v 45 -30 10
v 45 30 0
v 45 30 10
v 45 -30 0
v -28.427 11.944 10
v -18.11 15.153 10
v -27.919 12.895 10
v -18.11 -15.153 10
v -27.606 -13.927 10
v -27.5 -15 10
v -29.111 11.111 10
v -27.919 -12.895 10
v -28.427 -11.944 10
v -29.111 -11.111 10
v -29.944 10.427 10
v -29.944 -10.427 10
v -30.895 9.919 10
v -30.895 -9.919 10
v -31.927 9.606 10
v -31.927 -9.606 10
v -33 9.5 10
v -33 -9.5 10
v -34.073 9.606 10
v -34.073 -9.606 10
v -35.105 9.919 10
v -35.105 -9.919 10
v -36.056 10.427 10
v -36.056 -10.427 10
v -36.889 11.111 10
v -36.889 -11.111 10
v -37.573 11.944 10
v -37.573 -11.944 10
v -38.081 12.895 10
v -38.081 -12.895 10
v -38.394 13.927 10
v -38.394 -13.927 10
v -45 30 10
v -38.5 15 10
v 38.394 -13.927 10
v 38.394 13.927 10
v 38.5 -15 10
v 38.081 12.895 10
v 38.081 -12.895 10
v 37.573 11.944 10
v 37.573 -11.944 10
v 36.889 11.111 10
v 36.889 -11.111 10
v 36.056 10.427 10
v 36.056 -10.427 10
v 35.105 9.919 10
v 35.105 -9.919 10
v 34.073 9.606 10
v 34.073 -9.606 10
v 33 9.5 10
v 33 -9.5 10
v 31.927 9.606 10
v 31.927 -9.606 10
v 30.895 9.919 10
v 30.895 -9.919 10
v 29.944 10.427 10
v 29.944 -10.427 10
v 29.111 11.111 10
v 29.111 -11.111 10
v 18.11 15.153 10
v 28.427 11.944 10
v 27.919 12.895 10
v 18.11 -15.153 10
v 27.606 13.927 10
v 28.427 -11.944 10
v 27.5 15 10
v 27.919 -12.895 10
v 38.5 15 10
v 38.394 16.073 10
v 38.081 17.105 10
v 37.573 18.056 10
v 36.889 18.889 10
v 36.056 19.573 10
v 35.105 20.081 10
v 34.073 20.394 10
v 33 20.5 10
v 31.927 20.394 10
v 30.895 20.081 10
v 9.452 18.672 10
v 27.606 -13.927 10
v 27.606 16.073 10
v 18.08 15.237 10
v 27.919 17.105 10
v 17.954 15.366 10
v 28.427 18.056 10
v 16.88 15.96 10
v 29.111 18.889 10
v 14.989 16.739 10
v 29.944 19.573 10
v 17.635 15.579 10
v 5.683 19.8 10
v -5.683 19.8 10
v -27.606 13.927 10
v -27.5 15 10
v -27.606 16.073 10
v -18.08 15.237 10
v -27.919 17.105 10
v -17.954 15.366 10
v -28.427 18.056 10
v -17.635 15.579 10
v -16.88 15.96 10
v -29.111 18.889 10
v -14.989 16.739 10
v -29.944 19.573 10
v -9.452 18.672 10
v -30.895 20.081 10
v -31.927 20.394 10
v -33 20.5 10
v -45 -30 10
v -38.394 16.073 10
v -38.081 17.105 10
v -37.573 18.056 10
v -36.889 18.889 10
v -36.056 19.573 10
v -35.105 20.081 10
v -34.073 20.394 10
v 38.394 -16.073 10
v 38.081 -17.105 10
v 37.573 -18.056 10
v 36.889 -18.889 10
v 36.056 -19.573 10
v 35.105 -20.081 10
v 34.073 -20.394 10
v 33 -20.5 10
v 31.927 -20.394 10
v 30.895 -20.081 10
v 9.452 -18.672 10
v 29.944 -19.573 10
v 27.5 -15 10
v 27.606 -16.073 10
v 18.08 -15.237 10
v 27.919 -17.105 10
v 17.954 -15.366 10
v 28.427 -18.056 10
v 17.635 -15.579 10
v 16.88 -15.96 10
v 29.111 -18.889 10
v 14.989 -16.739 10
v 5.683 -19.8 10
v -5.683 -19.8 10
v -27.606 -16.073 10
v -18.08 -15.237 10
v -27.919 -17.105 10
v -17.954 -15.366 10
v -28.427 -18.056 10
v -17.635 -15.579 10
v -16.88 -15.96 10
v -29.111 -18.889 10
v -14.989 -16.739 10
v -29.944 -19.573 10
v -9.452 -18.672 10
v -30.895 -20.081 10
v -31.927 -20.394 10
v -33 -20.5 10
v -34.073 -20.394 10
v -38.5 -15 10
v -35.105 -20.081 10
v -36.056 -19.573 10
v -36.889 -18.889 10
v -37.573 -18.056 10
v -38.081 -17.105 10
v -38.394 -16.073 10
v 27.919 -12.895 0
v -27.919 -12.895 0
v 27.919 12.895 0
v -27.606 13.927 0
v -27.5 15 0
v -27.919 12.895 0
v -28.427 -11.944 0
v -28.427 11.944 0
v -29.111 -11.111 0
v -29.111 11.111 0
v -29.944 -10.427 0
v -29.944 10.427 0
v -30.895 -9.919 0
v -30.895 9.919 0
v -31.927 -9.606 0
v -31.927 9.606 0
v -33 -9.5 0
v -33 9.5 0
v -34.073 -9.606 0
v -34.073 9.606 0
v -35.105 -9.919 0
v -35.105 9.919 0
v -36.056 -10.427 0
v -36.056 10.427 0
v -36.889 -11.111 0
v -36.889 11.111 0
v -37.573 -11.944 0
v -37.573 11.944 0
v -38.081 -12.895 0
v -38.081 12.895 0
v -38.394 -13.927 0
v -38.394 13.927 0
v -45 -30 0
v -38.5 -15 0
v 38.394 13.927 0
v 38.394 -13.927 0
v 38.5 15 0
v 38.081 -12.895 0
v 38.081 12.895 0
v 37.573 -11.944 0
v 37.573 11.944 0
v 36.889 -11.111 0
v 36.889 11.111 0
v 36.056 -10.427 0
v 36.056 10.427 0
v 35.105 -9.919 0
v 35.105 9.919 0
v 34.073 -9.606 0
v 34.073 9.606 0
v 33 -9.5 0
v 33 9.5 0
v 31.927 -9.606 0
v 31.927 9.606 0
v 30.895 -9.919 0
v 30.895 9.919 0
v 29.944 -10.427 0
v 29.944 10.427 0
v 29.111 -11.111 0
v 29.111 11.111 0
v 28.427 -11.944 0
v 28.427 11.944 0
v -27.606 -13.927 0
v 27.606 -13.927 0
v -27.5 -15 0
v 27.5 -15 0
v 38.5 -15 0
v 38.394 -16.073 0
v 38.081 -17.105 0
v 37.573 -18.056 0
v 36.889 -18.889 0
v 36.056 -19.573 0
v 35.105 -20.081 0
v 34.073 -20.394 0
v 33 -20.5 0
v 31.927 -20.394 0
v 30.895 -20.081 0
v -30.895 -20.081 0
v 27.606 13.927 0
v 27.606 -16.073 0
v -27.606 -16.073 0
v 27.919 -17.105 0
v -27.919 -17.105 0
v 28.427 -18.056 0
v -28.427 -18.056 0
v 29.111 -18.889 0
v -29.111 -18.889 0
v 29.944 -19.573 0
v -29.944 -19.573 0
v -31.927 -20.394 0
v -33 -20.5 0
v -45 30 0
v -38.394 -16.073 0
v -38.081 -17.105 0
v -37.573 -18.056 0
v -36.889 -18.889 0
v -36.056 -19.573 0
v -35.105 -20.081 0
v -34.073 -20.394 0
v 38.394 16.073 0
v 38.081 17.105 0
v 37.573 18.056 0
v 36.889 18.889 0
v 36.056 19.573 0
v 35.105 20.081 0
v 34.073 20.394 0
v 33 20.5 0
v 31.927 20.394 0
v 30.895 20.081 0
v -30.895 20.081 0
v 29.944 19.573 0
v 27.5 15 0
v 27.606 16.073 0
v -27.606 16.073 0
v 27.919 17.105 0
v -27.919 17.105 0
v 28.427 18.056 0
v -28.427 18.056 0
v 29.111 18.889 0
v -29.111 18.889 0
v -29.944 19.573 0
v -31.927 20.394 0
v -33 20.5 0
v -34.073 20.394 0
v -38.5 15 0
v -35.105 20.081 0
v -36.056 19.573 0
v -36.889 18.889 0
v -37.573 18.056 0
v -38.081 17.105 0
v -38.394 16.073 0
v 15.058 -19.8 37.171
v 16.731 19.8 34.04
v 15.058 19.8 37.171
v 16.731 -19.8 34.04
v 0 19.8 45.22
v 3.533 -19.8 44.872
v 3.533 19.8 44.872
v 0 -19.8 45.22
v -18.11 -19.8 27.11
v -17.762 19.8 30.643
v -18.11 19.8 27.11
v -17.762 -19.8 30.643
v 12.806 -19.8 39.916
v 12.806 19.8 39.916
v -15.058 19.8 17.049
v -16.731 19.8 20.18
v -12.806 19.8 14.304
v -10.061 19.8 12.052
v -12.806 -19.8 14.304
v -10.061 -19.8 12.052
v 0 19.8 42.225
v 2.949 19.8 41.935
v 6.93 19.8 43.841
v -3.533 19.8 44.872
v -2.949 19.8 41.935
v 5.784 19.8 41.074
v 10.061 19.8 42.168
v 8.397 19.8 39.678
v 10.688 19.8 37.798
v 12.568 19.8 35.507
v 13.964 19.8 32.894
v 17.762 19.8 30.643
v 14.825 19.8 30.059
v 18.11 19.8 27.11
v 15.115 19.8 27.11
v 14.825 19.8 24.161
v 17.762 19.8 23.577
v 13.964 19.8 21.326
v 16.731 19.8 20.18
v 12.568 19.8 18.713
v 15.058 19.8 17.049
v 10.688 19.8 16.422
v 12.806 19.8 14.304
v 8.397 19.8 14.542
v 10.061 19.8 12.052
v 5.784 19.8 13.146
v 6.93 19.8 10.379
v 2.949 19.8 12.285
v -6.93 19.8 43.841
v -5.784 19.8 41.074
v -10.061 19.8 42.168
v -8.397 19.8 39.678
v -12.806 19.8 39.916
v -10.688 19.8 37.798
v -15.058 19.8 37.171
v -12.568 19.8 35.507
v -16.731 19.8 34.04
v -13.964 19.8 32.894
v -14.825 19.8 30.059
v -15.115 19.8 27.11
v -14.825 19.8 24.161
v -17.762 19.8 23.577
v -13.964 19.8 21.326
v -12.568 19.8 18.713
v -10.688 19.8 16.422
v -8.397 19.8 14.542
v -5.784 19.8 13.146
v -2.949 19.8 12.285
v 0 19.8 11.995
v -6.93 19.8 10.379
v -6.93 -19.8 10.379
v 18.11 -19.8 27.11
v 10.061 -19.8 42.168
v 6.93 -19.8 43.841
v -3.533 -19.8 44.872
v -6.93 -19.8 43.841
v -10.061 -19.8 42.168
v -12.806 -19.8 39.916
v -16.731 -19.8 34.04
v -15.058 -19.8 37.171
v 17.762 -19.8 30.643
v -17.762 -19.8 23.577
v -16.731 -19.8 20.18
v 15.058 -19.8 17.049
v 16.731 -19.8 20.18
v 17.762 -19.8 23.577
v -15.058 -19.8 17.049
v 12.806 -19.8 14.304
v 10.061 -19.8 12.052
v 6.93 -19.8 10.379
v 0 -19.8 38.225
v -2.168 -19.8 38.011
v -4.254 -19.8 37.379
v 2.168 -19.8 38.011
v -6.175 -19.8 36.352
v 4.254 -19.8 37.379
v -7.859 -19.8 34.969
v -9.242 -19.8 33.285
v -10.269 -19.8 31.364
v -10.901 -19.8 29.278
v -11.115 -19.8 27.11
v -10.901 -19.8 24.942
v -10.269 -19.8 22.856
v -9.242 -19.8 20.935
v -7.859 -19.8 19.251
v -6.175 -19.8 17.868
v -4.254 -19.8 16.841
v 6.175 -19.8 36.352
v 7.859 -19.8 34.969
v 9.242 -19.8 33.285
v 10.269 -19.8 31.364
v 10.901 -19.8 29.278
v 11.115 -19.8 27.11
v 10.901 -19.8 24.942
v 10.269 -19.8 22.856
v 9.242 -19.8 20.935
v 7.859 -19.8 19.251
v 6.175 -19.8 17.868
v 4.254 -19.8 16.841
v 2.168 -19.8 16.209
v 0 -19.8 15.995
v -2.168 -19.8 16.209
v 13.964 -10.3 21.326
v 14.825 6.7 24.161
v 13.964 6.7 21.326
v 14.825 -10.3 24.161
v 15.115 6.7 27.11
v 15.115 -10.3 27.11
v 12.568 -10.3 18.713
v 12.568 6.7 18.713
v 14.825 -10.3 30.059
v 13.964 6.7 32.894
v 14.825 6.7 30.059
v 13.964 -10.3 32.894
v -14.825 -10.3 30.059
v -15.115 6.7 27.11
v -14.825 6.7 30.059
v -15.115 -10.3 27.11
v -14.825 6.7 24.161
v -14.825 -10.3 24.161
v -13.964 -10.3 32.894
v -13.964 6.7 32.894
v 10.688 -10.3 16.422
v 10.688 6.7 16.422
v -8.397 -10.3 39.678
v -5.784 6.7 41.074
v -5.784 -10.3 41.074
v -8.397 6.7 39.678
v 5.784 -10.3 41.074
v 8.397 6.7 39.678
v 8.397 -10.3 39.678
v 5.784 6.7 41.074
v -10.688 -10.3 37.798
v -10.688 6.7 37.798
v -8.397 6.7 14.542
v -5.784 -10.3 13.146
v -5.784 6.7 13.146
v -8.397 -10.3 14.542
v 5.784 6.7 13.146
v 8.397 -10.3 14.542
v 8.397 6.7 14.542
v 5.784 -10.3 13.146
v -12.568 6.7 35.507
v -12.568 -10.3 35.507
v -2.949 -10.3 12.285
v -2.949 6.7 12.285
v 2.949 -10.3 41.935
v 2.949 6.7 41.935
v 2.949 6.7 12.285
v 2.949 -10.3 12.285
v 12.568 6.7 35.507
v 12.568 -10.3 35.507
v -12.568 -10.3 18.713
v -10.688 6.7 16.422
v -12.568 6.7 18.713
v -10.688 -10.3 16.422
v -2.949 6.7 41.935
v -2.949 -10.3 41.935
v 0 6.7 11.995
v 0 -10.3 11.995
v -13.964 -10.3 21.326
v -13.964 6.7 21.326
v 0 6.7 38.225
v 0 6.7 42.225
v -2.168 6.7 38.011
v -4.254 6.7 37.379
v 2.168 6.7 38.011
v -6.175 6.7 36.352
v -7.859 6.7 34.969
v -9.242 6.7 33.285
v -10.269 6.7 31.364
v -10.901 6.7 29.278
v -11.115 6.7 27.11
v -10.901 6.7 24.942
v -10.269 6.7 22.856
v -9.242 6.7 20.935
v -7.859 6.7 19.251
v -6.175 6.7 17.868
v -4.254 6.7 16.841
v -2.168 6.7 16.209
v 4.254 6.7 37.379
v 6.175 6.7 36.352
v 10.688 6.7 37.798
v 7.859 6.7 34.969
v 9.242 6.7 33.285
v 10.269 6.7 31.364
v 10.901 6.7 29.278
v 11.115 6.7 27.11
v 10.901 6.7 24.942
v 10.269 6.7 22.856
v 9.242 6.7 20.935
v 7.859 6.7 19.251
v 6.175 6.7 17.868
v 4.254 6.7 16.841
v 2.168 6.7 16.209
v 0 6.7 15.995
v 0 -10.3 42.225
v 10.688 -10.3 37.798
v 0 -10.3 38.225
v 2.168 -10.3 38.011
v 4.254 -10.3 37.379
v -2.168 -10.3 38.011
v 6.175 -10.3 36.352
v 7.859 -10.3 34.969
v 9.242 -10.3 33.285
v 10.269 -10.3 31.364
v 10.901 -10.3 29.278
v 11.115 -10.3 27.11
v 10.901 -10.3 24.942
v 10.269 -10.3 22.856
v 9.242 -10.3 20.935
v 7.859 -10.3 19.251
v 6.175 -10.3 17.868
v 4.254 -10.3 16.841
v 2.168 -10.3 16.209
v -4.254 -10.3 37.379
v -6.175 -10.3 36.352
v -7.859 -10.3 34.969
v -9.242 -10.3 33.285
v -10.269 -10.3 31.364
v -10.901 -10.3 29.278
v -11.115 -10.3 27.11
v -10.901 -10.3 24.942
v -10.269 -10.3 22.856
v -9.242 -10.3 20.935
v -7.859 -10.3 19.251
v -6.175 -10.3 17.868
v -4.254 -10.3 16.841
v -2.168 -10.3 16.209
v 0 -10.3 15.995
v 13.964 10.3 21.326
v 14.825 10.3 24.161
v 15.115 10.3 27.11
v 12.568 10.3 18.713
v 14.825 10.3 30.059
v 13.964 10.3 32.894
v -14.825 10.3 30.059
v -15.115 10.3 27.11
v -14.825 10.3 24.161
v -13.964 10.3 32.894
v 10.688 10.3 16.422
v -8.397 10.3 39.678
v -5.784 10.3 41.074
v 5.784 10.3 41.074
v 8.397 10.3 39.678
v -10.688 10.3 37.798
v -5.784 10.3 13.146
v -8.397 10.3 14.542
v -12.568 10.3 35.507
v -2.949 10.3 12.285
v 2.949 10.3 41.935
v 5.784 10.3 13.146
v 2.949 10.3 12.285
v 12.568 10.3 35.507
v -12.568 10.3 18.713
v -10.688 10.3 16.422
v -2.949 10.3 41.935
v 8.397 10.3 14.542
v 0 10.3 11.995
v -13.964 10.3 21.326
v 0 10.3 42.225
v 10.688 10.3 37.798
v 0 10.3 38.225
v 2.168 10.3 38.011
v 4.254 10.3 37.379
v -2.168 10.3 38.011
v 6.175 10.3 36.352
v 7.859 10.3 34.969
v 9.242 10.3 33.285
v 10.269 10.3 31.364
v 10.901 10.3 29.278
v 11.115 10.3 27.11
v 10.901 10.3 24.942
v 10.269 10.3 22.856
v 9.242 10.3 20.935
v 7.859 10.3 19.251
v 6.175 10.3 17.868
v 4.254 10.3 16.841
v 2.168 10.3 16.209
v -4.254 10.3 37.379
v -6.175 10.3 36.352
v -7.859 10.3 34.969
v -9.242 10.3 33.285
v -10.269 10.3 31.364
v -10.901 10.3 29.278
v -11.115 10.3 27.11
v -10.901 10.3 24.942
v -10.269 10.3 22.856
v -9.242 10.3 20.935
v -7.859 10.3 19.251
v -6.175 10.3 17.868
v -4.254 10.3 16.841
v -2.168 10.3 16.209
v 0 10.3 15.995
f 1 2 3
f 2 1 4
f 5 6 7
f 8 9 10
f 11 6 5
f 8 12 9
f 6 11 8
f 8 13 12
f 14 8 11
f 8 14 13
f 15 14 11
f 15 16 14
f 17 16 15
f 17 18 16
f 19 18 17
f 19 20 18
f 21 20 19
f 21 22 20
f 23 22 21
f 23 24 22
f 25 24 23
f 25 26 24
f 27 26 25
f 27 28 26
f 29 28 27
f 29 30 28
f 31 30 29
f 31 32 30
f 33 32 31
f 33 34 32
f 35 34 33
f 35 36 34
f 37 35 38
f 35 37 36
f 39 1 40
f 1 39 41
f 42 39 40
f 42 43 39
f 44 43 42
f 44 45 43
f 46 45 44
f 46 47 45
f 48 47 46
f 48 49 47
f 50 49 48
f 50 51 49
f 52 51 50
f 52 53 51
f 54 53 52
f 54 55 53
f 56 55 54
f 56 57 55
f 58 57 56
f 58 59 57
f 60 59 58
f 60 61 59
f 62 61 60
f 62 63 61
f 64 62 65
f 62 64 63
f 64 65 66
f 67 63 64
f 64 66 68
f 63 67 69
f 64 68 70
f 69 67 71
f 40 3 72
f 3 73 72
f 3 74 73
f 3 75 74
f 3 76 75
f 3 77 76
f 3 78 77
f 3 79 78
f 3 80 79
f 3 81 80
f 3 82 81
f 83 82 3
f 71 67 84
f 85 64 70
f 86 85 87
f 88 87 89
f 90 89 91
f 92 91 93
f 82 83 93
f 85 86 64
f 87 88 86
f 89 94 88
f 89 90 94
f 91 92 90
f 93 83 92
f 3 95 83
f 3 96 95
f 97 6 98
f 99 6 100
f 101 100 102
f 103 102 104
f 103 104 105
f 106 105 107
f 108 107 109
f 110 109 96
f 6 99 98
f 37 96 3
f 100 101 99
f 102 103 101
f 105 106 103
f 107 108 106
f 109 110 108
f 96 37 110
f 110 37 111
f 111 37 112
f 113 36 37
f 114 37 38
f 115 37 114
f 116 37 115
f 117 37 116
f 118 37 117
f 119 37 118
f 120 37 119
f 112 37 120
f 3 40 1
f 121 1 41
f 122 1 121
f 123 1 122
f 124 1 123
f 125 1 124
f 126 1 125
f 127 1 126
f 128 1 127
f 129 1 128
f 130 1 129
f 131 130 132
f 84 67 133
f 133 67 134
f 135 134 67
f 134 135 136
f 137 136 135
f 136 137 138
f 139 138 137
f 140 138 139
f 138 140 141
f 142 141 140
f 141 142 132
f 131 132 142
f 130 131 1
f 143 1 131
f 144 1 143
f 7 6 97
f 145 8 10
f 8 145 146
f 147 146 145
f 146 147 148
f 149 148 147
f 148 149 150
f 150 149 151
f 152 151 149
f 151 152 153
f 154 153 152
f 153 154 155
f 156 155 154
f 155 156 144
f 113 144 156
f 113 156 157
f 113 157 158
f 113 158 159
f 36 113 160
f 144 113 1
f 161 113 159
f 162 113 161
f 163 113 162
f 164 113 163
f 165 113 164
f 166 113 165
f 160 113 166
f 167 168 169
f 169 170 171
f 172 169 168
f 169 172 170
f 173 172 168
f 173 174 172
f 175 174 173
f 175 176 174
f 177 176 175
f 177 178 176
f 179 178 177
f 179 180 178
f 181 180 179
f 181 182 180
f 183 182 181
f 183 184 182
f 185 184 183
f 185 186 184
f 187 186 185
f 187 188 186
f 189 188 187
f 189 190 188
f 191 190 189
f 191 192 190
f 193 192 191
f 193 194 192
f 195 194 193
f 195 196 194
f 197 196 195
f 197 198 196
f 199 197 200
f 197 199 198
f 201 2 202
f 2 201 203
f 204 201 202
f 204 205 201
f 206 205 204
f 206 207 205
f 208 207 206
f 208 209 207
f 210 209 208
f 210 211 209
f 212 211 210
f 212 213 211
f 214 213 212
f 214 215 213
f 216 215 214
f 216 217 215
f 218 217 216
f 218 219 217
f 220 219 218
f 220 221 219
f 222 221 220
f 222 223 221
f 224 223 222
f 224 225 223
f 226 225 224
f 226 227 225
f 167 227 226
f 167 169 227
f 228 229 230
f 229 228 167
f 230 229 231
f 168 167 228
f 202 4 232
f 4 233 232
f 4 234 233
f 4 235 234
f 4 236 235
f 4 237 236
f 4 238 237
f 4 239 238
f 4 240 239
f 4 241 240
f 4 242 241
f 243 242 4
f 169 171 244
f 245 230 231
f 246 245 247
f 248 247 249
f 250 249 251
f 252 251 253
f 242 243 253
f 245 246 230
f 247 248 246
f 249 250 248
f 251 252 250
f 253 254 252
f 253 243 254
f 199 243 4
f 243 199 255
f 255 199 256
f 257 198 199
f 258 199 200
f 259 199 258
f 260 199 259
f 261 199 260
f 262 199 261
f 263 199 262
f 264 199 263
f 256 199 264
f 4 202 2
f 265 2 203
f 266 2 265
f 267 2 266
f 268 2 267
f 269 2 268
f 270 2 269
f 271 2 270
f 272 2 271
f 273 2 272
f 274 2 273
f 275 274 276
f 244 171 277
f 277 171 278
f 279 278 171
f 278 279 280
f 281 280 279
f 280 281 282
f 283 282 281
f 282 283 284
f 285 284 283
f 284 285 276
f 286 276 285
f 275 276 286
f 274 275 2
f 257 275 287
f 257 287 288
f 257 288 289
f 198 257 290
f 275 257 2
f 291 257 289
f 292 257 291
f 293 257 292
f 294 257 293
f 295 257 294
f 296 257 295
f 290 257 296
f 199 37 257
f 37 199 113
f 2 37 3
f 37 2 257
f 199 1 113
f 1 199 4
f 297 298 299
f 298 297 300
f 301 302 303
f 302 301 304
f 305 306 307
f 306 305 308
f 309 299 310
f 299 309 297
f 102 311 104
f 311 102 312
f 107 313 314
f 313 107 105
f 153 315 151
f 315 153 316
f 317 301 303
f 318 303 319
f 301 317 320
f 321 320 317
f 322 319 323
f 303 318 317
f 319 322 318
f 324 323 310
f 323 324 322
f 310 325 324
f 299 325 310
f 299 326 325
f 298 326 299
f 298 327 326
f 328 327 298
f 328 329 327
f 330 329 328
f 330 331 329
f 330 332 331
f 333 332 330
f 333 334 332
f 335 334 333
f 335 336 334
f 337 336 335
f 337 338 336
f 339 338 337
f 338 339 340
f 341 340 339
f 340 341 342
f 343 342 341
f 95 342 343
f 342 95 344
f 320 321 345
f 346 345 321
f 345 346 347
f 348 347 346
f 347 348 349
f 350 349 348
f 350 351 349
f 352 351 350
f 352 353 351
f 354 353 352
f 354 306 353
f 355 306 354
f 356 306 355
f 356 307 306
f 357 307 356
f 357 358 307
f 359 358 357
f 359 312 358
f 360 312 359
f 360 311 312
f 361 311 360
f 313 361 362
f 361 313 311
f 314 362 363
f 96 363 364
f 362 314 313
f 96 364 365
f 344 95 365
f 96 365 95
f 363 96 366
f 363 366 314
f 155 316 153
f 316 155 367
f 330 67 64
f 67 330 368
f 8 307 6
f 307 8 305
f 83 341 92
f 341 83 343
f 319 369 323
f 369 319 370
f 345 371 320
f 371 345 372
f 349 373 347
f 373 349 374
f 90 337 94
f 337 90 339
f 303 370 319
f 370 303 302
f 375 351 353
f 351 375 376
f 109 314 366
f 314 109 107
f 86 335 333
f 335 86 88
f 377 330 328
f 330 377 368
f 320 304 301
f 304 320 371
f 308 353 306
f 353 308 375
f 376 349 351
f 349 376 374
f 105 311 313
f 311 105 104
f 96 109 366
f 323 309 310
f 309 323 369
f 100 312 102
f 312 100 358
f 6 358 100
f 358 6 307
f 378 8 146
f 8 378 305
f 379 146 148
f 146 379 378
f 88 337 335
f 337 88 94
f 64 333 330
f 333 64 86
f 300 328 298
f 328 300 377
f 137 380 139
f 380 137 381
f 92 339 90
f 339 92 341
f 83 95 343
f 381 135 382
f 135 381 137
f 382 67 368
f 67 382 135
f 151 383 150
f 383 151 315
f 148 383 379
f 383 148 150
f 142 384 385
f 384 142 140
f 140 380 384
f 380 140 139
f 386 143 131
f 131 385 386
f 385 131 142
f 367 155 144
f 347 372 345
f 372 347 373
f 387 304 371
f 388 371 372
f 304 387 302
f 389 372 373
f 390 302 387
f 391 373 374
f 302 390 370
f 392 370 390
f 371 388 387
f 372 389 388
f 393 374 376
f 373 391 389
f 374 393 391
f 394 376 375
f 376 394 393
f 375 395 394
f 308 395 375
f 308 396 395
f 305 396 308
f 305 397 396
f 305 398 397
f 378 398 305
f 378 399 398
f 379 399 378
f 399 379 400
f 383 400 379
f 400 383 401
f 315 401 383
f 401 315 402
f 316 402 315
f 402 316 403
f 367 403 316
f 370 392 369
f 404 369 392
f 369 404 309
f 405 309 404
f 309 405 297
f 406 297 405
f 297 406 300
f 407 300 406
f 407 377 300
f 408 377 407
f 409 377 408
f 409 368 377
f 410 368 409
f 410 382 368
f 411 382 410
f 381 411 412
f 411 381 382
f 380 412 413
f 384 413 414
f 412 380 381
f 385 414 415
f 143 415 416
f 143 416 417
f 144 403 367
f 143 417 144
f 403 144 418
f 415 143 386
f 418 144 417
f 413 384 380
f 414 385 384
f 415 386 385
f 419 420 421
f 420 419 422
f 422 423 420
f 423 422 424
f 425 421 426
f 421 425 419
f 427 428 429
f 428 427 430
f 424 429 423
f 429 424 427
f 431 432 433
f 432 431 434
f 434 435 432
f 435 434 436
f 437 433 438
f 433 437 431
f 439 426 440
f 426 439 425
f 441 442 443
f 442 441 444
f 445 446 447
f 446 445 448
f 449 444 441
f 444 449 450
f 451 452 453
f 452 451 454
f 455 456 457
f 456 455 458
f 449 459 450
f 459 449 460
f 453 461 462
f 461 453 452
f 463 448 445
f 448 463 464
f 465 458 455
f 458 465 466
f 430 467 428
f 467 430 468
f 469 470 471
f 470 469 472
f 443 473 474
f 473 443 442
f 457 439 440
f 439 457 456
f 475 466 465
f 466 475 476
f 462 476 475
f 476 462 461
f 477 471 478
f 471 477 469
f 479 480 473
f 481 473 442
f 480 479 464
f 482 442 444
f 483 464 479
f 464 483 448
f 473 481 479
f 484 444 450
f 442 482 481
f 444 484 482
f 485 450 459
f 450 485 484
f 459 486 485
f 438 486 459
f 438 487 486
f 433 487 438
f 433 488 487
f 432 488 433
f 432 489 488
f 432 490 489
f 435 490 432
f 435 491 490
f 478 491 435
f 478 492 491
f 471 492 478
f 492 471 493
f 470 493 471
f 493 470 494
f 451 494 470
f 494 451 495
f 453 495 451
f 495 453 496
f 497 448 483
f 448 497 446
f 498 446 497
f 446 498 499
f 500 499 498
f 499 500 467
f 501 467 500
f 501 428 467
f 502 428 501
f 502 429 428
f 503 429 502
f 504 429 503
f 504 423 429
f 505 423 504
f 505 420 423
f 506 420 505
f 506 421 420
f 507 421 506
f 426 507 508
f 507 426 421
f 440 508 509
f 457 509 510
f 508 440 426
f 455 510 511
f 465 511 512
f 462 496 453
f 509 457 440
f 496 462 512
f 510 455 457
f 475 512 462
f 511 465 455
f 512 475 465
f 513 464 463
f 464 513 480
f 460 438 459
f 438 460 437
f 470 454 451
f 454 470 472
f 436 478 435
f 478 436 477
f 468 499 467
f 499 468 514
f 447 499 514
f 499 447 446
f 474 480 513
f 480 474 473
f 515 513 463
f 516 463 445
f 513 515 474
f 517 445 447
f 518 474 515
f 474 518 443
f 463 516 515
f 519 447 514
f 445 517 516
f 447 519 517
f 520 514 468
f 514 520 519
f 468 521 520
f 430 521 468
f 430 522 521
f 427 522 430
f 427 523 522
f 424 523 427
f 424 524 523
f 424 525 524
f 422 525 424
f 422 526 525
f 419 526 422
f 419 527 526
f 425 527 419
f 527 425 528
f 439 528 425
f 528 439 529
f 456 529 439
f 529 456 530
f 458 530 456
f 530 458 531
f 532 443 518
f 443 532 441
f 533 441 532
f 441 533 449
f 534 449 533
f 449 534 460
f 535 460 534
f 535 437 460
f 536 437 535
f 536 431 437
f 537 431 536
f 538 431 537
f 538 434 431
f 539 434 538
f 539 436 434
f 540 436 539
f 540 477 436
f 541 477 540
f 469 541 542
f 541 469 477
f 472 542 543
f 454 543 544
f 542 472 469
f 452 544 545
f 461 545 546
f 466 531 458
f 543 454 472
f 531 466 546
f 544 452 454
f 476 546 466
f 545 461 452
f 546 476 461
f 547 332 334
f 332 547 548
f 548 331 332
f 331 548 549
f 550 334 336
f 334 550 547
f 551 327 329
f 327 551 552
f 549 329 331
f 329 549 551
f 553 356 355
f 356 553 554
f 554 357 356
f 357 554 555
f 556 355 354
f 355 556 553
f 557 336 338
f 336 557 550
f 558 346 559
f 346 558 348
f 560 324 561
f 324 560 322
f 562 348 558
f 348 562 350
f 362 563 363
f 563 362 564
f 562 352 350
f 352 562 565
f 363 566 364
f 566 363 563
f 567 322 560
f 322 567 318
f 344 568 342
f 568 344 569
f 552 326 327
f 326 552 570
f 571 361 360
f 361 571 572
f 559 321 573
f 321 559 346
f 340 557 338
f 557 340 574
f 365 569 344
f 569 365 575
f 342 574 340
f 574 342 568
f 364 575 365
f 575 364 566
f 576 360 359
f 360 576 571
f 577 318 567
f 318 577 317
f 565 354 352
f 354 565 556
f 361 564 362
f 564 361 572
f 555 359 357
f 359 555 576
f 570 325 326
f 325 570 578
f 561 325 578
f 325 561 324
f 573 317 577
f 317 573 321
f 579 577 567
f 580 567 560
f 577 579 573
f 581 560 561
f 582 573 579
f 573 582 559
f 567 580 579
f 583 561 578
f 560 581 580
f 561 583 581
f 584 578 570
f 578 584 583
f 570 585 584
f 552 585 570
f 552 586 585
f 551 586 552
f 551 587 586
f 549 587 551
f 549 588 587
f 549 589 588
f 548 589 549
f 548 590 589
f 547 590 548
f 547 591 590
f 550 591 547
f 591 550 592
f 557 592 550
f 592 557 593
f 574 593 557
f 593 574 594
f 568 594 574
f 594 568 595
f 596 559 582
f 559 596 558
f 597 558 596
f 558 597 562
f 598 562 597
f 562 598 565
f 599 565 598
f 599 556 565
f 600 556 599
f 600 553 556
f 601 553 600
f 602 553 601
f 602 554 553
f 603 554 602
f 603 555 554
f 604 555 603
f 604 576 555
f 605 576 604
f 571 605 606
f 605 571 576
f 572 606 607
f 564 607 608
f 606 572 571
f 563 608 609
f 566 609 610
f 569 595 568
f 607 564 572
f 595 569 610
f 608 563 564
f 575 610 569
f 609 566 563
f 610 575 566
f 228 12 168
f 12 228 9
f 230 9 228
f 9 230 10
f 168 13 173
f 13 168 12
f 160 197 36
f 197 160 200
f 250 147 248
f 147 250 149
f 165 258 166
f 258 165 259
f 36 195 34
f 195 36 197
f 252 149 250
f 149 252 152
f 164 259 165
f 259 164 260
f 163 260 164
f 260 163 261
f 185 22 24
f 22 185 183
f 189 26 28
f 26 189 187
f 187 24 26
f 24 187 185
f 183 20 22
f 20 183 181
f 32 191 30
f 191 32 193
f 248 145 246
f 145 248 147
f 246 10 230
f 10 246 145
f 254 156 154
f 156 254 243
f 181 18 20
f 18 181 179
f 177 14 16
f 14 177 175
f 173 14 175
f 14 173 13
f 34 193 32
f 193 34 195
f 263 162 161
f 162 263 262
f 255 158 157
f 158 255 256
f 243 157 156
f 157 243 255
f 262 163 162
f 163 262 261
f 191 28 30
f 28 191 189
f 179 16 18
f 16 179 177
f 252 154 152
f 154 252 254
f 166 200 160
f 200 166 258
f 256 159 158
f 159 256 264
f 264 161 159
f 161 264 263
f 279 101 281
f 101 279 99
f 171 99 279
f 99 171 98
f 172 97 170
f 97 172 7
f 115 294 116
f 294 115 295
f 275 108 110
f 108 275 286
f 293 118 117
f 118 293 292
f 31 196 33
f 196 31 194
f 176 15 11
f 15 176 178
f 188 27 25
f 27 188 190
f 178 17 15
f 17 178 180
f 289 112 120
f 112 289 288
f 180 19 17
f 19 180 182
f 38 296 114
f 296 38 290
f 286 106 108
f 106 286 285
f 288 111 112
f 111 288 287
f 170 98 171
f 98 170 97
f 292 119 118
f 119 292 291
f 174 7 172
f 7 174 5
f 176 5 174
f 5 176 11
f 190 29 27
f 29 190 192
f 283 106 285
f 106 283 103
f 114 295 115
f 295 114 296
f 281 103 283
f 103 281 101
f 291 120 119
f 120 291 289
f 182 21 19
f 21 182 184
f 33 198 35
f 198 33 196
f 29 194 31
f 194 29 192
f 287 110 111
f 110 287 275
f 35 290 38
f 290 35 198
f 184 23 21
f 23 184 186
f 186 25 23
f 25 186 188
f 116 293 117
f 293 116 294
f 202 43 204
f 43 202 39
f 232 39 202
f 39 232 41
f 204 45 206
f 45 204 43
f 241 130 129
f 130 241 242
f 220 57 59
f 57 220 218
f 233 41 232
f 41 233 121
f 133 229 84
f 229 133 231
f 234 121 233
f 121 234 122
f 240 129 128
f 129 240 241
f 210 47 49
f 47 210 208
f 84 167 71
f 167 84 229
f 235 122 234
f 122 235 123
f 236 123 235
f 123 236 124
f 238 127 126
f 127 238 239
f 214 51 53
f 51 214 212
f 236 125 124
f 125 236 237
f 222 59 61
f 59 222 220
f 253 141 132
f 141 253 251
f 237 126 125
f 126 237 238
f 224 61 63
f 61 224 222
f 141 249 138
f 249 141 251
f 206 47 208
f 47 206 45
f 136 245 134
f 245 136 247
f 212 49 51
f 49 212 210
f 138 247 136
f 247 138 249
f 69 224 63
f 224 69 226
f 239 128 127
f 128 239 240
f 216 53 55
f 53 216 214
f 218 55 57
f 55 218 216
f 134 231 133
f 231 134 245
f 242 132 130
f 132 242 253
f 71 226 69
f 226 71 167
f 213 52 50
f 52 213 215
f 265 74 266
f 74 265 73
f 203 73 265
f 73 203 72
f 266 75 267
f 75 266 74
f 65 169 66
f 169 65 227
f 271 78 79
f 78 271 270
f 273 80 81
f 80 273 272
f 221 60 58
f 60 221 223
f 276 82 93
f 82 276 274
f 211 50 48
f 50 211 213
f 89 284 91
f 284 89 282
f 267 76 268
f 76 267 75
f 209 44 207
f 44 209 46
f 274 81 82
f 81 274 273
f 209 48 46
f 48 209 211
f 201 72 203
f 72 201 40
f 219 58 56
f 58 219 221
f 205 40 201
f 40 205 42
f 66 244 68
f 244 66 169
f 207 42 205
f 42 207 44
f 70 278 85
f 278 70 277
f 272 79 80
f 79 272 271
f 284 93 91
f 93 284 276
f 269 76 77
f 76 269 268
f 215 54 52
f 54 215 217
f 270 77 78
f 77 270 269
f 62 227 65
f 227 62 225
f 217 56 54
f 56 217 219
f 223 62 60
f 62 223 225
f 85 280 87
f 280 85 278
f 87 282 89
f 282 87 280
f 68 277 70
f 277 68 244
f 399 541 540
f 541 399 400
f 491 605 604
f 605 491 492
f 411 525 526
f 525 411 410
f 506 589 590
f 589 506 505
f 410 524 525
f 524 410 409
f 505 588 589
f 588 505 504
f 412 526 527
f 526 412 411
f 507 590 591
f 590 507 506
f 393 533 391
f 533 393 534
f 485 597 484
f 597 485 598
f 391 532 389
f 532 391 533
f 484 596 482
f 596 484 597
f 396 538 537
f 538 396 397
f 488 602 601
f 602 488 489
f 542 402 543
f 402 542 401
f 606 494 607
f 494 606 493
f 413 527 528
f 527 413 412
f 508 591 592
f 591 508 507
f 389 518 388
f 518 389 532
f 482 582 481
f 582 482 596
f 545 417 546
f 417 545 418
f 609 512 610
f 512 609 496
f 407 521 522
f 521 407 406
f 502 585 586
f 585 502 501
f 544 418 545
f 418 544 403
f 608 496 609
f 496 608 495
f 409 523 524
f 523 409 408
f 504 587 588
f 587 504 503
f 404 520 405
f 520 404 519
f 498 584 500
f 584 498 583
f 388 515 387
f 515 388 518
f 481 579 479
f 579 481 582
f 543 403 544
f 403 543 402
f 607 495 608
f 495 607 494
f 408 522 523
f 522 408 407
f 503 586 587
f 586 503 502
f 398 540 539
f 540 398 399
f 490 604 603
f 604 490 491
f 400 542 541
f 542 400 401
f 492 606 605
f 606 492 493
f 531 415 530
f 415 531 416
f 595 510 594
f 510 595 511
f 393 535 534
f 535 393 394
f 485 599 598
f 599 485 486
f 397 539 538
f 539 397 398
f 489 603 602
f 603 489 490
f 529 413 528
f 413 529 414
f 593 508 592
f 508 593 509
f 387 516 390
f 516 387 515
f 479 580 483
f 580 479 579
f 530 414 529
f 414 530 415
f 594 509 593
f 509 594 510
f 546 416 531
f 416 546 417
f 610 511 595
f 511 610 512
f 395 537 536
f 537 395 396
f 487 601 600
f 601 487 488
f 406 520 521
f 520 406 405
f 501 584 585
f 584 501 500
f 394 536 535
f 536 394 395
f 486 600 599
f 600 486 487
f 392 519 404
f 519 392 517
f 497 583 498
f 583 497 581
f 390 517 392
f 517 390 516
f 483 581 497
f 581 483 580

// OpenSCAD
$fn = 32;

// ----------------------------------------------------------------------
// Bearing block: 90 x 60 mm base, 22.23 mm bore at 27.11 mm
// ----------------------------------------------------------------------

// --- parameters (mm) ---
base_w = 90;              // base width
base_d = 60;              // base depth
base_t = 10;              // base thickness
bore_d = 22.23;           // shaft / bearing bore
house_r = 18.11;          // housing outer radius
house_len = 39.6;         // housing length along the shaft
foot_w = 36.22;           // foot width under the housing
foot_len = 29.6;          // foot length along the shaft
axis_z = 27.11;           // bore axis height above the base
holes_d = 11;             // mounting holes
hole_x = 33;              // mounting hole spacing
seat_d = 12;              // bearing seat depth
seat_wall = 4;            // seat wall thickness

difference() {
  union() {
    /* base plate with its underside on z = 0 */
    translate([0, 0, base_t / 2]) cube([base_w, base_d, base_t], center = true);
    /* hull foot: a straight web blending into the round housing */
    hull() {
      translate([0, 0, base_t - 0.5]) cube([foot_w, foot_len, 1.6], center = true);
      translate([0, 0, axis_z]) rotate([-90, 0, 0]) cylinder(h = house_len, d = 2 * house_r, center = true);
    }
  }
  /* bore through the housing, 2.5 mm clear on both sides */
  translate([0, 0, axis_z]) rotate([-90, 0, 0]) cylinder(h = house_len + 5, d = bore_d, center = true);
  /* bearing seats, recessed into both ends of the housing */
  for (sy = [-1, 1]) {
    translate([0, sy * (house_len / 2 - seat_d + 2.5), axis_z]) rotate([-90, 0, 0]) cylinder(h = seat_d + 5, d = bore_d + 2 * seat_wall);
  }
  /* mounting holes through the base plate */
  for (hx = [-33, 33]) {
    for (hy = [-15, 15]) {
      translate([hx, hy, -2.5]) cylinder(h = base_t + 5, d = holes_d);
    }
  }
}
